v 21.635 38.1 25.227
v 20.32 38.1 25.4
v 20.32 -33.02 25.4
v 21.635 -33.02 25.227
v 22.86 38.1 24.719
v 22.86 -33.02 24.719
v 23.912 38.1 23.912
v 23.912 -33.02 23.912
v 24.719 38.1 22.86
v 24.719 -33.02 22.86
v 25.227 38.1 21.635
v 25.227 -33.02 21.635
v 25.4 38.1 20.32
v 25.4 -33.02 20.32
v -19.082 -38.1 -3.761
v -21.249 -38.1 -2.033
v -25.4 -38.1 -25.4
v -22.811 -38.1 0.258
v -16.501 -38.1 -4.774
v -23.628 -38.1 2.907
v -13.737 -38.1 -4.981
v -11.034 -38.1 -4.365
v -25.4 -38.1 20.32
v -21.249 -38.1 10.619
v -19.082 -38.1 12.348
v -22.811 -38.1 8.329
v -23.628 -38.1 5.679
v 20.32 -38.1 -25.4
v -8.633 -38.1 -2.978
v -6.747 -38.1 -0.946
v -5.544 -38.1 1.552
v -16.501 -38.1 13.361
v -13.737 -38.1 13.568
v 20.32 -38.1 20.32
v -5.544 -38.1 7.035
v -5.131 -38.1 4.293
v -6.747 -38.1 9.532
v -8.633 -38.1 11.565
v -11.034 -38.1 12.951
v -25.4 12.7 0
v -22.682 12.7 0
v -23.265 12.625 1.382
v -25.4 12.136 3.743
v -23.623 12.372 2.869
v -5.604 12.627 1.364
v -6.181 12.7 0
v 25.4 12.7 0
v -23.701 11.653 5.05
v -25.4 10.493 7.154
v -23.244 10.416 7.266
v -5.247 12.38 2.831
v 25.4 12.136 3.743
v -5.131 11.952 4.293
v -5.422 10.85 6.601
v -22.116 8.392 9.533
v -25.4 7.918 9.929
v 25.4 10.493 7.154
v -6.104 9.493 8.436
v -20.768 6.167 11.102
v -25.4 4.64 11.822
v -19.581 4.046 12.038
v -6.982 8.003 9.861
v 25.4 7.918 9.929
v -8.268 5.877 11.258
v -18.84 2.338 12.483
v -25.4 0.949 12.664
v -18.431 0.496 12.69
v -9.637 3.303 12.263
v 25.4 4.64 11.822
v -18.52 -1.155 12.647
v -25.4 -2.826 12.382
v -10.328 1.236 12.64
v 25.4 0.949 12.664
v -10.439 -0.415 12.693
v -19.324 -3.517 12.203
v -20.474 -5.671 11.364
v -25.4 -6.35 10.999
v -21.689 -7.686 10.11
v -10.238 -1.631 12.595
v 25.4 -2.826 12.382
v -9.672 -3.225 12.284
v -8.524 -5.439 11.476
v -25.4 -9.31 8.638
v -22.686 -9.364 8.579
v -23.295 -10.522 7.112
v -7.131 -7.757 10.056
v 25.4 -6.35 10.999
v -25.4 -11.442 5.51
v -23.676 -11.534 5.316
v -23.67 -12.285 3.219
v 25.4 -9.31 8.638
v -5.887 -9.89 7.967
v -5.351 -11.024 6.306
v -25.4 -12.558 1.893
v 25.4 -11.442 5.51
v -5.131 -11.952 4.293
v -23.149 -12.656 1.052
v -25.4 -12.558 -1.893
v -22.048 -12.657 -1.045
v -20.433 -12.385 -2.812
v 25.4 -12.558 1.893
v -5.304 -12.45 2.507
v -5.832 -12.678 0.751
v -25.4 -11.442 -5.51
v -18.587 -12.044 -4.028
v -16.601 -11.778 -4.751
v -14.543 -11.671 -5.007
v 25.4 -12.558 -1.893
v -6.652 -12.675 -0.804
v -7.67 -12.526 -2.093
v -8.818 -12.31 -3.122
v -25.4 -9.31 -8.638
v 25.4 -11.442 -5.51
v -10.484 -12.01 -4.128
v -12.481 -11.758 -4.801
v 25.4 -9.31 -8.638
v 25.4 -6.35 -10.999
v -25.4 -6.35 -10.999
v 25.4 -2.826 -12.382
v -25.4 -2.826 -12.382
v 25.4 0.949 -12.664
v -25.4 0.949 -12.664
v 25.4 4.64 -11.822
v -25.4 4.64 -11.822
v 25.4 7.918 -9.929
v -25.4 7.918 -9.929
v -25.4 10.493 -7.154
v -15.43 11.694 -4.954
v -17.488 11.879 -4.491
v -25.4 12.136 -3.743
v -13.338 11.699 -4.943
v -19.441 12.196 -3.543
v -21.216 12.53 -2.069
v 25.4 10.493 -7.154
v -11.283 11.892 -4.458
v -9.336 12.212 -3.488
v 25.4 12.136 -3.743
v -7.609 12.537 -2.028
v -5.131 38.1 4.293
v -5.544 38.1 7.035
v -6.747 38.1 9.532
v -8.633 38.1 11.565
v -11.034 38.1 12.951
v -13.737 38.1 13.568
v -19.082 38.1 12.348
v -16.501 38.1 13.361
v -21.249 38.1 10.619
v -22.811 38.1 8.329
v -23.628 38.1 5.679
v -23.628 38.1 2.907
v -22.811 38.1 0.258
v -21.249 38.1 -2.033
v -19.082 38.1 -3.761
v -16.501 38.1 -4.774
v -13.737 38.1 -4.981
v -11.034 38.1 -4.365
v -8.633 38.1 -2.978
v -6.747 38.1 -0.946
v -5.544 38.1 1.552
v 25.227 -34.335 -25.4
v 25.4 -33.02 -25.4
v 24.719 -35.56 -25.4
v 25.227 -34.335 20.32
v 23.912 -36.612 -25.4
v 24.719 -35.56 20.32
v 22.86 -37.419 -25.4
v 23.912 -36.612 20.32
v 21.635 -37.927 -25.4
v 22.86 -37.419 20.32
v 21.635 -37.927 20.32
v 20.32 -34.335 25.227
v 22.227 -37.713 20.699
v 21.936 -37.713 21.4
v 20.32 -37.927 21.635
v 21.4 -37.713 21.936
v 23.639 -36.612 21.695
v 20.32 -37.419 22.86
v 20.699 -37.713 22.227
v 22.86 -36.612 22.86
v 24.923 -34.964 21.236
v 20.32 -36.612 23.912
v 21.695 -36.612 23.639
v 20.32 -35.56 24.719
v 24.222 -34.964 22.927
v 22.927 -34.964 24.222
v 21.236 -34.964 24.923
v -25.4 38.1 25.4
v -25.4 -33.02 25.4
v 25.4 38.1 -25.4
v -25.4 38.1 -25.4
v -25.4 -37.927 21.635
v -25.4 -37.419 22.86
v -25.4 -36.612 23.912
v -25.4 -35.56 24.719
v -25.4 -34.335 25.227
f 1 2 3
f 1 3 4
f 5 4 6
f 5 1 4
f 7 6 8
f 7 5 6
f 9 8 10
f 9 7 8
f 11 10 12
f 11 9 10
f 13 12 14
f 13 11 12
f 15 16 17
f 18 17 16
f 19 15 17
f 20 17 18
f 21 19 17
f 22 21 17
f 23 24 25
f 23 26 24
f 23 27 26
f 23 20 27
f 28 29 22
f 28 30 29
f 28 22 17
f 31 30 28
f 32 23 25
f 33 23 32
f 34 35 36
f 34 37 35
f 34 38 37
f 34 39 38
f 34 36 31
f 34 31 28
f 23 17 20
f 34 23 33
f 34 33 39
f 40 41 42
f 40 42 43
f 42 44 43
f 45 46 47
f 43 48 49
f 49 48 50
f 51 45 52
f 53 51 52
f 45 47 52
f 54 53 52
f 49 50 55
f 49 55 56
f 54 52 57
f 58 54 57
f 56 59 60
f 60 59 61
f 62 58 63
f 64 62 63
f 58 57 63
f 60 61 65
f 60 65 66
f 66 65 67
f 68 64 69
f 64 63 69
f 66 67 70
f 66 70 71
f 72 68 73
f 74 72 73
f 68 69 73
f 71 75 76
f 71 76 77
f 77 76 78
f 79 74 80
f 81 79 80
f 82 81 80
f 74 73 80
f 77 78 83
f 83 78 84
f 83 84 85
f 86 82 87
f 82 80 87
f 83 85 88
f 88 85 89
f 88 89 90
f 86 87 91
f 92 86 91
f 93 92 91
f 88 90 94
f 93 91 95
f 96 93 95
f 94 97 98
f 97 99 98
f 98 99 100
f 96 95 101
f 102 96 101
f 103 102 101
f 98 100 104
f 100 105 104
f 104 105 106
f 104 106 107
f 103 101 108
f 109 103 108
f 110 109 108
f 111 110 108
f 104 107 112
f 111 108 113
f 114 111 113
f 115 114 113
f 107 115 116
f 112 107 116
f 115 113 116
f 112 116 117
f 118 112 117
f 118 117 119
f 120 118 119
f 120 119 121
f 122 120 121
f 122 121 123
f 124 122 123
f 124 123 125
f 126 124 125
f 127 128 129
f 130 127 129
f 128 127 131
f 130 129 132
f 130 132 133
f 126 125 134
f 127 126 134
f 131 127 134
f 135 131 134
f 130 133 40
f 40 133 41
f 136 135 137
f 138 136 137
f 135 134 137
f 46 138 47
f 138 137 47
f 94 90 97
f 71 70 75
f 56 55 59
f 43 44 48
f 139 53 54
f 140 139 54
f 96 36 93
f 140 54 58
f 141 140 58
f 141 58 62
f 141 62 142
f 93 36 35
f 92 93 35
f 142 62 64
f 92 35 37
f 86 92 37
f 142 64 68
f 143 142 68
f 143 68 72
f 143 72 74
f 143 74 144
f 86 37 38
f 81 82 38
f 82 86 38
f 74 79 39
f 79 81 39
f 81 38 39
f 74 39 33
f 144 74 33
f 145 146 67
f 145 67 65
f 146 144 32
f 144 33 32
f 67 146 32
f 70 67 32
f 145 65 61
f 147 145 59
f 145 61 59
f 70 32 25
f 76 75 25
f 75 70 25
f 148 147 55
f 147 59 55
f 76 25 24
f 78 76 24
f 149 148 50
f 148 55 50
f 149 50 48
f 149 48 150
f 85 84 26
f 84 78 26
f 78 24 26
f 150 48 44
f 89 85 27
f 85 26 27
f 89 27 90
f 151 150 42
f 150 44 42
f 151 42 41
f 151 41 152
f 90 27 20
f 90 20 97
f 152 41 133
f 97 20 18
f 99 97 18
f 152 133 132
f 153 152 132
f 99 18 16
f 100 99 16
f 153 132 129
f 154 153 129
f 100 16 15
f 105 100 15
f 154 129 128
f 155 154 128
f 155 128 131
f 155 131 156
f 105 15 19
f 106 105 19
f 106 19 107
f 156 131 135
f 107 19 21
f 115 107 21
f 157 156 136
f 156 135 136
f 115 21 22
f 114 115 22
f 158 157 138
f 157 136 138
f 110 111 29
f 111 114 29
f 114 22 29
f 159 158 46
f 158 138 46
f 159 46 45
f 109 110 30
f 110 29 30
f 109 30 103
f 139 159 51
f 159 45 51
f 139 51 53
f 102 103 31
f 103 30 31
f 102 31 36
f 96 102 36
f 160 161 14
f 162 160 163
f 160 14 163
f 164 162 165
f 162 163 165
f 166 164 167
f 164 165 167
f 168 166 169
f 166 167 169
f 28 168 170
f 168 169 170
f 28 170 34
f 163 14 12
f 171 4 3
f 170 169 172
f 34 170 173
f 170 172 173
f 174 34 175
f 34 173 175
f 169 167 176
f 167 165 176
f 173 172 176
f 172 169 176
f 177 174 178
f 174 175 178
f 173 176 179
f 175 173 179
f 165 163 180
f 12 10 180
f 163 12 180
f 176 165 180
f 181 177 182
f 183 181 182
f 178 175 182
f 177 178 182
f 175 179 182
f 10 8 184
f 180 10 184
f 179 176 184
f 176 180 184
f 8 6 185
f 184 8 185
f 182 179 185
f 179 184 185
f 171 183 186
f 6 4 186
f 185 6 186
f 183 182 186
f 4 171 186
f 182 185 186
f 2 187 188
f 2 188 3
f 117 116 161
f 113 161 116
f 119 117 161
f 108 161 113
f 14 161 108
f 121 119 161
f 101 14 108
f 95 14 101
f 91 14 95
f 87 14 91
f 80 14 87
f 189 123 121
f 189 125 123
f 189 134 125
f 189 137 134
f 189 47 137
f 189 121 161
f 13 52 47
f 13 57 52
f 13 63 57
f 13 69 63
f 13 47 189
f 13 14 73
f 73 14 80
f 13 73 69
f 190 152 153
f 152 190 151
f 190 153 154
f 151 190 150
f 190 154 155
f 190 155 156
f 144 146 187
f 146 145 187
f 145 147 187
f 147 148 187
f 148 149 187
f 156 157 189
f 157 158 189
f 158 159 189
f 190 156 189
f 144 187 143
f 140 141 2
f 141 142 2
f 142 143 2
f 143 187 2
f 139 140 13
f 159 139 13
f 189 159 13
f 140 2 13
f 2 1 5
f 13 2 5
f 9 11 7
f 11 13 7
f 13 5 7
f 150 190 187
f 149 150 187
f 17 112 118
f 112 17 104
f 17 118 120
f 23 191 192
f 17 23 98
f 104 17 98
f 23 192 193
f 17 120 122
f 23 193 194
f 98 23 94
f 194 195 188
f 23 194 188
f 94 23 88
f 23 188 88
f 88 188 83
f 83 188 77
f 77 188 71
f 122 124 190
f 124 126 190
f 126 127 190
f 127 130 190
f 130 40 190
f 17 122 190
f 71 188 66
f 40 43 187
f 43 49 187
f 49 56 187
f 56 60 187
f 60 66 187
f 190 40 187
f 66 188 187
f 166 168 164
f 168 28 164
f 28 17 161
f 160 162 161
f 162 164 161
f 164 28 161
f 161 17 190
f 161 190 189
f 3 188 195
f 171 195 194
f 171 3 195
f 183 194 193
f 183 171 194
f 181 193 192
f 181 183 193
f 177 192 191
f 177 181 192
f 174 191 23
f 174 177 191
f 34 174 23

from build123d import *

# Parameters (mm, degrees)
F0_W     = 50.8
F0_H     = 76.2
F1_DEPTH = 25.4
F2_R     = 5.08
F3_R     = 12.7
F4_DEPTH = 50.801
F5_R     = 9.300701
F6_DEPTH = 76.201


with BuildPart() as f1:
    # F0 (on Top) → F1 (new body, symmetric)
    with BuildSketch(Plane.XY):
        Rectangle(F0_W, F0_H)
    extrude(amount=F1_DEPTH, both=True)

    # F2
    f2_edges = [f1.edges().sort_by_distance(p)[0] for p in [
        (25.4, 0, 25.4),
        (25.4, -38.1, 0),
        (0, -38.1, 25.4),
    ]]
    fillet(f2_edges, radius=F2_R)

    # F3 (on face) → F4 (cut, through all)
    with BuildSketch(Plane.YZ.offset(25.4)):
        Circle(F3_R)
    extrude(amount=-F4_DEPTH, mode=Mode.SUBTRACT)

    # F5 (on face) → F6 (cut, through all)
    with BuildSketch(Plane.XZ.offset(38.1)):
        with Locations((-14.431597, 4.293228)):
            Circle(F5_R)
    extrude(amount=-F6_DEPTH, mode=Mode.SUBTRACT)


solid = f1.part
